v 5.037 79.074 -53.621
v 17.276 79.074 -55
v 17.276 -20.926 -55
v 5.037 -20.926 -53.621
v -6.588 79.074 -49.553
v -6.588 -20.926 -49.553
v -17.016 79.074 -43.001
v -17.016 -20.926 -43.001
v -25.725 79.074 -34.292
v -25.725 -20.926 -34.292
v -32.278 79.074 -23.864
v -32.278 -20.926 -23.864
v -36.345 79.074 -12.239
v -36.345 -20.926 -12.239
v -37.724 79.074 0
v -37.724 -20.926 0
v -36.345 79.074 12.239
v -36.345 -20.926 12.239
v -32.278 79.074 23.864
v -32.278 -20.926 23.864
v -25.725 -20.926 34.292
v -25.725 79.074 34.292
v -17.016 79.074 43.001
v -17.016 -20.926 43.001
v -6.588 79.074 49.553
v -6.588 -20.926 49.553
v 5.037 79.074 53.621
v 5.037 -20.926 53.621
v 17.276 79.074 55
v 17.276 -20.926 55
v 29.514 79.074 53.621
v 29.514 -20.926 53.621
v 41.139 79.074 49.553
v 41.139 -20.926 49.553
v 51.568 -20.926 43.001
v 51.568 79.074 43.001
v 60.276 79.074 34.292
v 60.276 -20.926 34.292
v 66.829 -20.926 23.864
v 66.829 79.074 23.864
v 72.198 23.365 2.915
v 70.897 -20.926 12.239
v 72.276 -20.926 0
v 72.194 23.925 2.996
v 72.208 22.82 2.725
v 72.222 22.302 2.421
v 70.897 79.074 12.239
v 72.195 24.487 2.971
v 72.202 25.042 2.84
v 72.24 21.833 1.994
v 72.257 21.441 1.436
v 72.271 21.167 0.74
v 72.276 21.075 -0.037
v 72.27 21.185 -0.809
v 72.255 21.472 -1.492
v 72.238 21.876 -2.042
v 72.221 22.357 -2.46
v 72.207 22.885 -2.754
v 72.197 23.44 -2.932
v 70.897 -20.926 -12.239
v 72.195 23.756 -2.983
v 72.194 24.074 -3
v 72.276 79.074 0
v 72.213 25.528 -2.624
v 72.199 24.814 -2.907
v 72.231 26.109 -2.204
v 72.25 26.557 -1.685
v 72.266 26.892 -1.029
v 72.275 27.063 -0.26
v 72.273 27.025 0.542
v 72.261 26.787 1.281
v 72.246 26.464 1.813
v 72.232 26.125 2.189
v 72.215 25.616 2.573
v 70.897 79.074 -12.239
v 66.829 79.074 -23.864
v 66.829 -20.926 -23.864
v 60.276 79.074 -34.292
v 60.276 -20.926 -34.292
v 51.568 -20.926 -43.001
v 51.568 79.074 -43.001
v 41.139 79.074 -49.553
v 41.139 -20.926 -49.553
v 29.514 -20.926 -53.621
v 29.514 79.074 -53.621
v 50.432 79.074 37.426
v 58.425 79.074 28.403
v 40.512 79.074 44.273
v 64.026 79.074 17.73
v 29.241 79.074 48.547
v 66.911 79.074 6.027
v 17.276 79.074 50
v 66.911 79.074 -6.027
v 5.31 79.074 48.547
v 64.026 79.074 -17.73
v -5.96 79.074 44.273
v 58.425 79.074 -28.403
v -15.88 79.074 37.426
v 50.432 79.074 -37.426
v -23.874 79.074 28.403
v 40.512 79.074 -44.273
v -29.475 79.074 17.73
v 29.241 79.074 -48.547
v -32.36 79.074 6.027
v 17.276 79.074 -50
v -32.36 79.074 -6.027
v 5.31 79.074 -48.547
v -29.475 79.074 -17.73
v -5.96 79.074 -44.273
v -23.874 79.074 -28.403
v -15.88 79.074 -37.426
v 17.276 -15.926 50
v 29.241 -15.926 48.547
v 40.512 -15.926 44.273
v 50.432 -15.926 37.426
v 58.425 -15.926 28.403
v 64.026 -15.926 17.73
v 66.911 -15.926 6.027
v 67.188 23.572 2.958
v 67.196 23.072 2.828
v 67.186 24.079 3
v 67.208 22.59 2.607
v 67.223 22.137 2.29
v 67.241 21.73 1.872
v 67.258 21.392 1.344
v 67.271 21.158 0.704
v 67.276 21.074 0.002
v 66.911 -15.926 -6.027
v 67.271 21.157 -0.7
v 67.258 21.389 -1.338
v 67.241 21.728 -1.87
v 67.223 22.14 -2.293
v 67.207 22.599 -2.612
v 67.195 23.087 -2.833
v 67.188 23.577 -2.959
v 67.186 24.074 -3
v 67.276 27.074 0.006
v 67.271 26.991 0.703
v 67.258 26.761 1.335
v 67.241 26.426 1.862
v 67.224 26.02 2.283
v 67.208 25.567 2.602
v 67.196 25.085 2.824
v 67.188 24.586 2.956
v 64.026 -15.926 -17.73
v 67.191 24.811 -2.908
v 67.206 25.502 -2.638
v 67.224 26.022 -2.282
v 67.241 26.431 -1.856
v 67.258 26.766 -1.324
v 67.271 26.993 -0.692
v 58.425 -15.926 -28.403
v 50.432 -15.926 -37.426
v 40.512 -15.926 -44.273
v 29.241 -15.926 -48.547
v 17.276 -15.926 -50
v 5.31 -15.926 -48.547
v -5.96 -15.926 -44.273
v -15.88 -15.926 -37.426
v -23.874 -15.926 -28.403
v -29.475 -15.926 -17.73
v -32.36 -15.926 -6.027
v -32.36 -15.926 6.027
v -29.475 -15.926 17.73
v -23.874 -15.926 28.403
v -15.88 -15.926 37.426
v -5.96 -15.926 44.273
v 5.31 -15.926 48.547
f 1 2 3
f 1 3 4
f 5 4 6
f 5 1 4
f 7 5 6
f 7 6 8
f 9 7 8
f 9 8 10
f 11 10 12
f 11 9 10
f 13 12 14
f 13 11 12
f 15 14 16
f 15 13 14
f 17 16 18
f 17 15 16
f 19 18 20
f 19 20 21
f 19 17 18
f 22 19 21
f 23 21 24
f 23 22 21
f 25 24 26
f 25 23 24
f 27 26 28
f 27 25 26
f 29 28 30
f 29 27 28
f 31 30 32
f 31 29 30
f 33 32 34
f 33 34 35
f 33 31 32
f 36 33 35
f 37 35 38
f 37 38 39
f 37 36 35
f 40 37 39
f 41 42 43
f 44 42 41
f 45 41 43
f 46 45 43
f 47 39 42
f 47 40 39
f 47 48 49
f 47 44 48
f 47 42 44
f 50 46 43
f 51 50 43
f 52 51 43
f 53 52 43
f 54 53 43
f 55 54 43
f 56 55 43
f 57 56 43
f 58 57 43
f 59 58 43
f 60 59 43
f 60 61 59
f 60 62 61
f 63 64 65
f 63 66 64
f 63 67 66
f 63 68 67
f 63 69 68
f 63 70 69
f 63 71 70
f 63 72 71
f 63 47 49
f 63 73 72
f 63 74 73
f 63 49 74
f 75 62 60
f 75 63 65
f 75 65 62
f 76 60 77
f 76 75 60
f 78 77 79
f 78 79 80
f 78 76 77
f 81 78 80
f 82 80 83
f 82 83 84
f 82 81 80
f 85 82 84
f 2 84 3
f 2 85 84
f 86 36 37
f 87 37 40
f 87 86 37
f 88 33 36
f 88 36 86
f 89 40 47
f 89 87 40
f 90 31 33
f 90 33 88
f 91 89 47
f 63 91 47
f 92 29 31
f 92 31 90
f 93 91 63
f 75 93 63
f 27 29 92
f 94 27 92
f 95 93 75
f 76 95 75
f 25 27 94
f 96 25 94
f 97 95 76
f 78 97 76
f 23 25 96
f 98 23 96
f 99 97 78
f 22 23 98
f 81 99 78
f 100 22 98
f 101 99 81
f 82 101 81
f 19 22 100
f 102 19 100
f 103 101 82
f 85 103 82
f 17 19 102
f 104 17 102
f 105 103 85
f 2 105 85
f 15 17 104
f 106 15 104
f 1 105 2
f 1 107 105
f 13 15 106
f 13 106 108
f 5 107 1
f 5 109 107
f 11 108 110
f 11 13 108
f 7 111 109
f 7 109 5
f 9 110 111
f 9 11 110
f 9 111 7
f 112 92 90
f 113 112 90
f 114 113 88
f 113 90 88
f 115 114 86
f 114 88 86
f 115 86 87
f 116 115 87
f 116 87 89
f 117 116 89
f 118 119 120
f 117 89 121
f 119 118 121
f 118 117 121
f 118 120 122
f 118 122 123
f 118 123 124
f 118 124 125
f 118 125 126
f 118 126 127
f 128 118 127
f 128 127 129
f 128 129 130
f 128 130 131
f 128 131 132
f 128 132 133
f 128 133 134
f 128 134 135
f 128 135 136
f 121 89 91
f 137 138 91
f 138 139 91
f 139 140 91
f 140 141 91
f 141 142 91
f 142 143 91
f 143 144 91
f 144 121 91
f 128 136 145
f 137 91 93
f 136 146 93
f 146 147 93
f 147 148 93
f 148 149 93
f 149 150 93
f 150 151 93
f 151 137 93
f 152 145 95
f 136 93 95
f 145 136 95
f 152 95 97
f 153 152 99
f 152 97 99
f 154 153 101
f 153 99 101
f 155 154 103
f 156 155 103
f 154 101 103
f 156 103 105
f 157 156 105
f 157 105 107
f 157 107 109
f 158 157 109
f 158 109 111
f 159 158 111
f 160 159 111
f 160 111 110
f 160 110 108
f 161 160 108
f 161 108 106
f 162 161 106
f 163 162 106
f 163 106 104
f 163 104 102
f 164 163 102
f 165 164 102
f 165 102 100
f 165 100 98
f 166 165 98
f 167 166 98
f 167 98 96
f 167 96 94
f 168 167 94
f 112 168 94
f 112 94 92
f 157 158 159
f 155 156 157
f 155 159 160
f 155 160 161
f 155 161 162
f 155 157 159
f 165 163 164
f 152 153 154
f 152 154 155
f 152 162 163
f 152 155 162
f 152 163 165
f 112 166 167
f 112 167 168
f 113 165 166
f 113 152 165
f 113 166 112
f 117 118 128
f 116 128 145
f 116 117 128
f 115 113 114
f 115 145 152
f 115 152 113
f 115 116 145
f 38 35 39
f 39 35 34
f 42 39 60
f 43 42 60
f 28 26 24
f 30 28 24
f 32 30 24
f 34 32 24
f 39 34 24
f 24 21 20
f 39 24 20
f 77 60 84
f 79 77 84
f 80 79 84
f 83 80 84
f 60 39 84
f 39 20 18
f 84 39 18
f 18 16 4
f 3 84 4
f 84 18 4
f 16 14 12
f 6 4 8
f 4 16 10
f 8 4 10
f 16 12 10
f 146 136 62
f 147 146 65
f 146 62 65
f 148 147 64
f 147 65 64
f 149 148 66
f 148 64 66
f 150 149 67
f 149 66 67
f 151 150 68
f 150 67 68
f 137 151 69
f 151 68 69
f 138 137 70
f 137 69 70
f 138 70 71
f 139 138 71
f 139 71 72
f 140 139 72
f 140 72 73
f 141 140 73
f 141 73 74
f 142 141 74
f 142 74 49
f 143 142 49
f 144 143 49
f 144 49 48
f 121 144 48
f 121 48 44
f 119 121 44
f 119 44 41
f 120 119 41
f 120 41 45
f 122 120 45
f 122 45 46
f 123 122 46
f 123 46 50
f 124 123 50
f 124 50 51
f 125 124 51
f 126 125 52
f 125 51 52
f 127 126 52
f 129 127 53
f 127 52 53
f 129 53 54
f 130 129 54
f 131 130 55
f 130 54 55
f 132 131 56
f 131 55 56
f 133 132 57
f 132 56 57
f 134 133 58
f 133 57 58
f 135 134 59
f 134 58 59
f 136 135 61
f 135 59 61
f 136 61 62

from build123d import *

# Parameters (mm, degrees)
SKETCH2_W          = 55
SKETCH2_H          = 100
SKETCH3_R          = 50
CUT_EXTRUDE2_DEPTH = 95
SKETCH5_R          = 3
CUT_EXTRUDE4_DEPTH = 49


with BuildPart() as part:
    # Sketch2 → Revolve1 (revolve)
    with BuildSketch(Plane.XY, mode=Mode.PRIVATE) as revolve1_sk:
        with Locations((-10.224323353, 29.074307692)):
            Rectangle(SKETCH2_W, SKETCH2_H)
    revolve(revolve1_sk.sketch.rotate(Axis((17.275676647, -20.925692308, 0), (0, 1, 0)), 270), axis=Axis((17.275676647, -20.925692308, 0), (0, 1, 0)))

    # Sketch3 → Cut-Extrude2 (cut)
    with BuildSketch(Plane(origin=(0, 79.074307692, 0), x_dir=(1, 0, 0), z_dir=(0, 1, 0))):
        with Locations(Location((17.275676647, 0, 0), (0, 0, 270))):
            Circle(SKETCH3_R)
    extrude(amount=-CUT_EXTRUDE2_DEPTH, mode=Mode.SUBTRACT)

    # Sketch5 → Cut-Extrude4 (cut)
    with BuildSketch(Plane(origin=(75, 0, 0), x_dir=(0, 0, -1), z_dir=(1, 0, 0))):
        with Locations((0, 24.074307692)):
            Circle(SKETCH5_R)
    extrude(amount=-CUT_EXTRUDE4_DEPTH, mode=Mode.SUBTRACT)


solid = part.part
